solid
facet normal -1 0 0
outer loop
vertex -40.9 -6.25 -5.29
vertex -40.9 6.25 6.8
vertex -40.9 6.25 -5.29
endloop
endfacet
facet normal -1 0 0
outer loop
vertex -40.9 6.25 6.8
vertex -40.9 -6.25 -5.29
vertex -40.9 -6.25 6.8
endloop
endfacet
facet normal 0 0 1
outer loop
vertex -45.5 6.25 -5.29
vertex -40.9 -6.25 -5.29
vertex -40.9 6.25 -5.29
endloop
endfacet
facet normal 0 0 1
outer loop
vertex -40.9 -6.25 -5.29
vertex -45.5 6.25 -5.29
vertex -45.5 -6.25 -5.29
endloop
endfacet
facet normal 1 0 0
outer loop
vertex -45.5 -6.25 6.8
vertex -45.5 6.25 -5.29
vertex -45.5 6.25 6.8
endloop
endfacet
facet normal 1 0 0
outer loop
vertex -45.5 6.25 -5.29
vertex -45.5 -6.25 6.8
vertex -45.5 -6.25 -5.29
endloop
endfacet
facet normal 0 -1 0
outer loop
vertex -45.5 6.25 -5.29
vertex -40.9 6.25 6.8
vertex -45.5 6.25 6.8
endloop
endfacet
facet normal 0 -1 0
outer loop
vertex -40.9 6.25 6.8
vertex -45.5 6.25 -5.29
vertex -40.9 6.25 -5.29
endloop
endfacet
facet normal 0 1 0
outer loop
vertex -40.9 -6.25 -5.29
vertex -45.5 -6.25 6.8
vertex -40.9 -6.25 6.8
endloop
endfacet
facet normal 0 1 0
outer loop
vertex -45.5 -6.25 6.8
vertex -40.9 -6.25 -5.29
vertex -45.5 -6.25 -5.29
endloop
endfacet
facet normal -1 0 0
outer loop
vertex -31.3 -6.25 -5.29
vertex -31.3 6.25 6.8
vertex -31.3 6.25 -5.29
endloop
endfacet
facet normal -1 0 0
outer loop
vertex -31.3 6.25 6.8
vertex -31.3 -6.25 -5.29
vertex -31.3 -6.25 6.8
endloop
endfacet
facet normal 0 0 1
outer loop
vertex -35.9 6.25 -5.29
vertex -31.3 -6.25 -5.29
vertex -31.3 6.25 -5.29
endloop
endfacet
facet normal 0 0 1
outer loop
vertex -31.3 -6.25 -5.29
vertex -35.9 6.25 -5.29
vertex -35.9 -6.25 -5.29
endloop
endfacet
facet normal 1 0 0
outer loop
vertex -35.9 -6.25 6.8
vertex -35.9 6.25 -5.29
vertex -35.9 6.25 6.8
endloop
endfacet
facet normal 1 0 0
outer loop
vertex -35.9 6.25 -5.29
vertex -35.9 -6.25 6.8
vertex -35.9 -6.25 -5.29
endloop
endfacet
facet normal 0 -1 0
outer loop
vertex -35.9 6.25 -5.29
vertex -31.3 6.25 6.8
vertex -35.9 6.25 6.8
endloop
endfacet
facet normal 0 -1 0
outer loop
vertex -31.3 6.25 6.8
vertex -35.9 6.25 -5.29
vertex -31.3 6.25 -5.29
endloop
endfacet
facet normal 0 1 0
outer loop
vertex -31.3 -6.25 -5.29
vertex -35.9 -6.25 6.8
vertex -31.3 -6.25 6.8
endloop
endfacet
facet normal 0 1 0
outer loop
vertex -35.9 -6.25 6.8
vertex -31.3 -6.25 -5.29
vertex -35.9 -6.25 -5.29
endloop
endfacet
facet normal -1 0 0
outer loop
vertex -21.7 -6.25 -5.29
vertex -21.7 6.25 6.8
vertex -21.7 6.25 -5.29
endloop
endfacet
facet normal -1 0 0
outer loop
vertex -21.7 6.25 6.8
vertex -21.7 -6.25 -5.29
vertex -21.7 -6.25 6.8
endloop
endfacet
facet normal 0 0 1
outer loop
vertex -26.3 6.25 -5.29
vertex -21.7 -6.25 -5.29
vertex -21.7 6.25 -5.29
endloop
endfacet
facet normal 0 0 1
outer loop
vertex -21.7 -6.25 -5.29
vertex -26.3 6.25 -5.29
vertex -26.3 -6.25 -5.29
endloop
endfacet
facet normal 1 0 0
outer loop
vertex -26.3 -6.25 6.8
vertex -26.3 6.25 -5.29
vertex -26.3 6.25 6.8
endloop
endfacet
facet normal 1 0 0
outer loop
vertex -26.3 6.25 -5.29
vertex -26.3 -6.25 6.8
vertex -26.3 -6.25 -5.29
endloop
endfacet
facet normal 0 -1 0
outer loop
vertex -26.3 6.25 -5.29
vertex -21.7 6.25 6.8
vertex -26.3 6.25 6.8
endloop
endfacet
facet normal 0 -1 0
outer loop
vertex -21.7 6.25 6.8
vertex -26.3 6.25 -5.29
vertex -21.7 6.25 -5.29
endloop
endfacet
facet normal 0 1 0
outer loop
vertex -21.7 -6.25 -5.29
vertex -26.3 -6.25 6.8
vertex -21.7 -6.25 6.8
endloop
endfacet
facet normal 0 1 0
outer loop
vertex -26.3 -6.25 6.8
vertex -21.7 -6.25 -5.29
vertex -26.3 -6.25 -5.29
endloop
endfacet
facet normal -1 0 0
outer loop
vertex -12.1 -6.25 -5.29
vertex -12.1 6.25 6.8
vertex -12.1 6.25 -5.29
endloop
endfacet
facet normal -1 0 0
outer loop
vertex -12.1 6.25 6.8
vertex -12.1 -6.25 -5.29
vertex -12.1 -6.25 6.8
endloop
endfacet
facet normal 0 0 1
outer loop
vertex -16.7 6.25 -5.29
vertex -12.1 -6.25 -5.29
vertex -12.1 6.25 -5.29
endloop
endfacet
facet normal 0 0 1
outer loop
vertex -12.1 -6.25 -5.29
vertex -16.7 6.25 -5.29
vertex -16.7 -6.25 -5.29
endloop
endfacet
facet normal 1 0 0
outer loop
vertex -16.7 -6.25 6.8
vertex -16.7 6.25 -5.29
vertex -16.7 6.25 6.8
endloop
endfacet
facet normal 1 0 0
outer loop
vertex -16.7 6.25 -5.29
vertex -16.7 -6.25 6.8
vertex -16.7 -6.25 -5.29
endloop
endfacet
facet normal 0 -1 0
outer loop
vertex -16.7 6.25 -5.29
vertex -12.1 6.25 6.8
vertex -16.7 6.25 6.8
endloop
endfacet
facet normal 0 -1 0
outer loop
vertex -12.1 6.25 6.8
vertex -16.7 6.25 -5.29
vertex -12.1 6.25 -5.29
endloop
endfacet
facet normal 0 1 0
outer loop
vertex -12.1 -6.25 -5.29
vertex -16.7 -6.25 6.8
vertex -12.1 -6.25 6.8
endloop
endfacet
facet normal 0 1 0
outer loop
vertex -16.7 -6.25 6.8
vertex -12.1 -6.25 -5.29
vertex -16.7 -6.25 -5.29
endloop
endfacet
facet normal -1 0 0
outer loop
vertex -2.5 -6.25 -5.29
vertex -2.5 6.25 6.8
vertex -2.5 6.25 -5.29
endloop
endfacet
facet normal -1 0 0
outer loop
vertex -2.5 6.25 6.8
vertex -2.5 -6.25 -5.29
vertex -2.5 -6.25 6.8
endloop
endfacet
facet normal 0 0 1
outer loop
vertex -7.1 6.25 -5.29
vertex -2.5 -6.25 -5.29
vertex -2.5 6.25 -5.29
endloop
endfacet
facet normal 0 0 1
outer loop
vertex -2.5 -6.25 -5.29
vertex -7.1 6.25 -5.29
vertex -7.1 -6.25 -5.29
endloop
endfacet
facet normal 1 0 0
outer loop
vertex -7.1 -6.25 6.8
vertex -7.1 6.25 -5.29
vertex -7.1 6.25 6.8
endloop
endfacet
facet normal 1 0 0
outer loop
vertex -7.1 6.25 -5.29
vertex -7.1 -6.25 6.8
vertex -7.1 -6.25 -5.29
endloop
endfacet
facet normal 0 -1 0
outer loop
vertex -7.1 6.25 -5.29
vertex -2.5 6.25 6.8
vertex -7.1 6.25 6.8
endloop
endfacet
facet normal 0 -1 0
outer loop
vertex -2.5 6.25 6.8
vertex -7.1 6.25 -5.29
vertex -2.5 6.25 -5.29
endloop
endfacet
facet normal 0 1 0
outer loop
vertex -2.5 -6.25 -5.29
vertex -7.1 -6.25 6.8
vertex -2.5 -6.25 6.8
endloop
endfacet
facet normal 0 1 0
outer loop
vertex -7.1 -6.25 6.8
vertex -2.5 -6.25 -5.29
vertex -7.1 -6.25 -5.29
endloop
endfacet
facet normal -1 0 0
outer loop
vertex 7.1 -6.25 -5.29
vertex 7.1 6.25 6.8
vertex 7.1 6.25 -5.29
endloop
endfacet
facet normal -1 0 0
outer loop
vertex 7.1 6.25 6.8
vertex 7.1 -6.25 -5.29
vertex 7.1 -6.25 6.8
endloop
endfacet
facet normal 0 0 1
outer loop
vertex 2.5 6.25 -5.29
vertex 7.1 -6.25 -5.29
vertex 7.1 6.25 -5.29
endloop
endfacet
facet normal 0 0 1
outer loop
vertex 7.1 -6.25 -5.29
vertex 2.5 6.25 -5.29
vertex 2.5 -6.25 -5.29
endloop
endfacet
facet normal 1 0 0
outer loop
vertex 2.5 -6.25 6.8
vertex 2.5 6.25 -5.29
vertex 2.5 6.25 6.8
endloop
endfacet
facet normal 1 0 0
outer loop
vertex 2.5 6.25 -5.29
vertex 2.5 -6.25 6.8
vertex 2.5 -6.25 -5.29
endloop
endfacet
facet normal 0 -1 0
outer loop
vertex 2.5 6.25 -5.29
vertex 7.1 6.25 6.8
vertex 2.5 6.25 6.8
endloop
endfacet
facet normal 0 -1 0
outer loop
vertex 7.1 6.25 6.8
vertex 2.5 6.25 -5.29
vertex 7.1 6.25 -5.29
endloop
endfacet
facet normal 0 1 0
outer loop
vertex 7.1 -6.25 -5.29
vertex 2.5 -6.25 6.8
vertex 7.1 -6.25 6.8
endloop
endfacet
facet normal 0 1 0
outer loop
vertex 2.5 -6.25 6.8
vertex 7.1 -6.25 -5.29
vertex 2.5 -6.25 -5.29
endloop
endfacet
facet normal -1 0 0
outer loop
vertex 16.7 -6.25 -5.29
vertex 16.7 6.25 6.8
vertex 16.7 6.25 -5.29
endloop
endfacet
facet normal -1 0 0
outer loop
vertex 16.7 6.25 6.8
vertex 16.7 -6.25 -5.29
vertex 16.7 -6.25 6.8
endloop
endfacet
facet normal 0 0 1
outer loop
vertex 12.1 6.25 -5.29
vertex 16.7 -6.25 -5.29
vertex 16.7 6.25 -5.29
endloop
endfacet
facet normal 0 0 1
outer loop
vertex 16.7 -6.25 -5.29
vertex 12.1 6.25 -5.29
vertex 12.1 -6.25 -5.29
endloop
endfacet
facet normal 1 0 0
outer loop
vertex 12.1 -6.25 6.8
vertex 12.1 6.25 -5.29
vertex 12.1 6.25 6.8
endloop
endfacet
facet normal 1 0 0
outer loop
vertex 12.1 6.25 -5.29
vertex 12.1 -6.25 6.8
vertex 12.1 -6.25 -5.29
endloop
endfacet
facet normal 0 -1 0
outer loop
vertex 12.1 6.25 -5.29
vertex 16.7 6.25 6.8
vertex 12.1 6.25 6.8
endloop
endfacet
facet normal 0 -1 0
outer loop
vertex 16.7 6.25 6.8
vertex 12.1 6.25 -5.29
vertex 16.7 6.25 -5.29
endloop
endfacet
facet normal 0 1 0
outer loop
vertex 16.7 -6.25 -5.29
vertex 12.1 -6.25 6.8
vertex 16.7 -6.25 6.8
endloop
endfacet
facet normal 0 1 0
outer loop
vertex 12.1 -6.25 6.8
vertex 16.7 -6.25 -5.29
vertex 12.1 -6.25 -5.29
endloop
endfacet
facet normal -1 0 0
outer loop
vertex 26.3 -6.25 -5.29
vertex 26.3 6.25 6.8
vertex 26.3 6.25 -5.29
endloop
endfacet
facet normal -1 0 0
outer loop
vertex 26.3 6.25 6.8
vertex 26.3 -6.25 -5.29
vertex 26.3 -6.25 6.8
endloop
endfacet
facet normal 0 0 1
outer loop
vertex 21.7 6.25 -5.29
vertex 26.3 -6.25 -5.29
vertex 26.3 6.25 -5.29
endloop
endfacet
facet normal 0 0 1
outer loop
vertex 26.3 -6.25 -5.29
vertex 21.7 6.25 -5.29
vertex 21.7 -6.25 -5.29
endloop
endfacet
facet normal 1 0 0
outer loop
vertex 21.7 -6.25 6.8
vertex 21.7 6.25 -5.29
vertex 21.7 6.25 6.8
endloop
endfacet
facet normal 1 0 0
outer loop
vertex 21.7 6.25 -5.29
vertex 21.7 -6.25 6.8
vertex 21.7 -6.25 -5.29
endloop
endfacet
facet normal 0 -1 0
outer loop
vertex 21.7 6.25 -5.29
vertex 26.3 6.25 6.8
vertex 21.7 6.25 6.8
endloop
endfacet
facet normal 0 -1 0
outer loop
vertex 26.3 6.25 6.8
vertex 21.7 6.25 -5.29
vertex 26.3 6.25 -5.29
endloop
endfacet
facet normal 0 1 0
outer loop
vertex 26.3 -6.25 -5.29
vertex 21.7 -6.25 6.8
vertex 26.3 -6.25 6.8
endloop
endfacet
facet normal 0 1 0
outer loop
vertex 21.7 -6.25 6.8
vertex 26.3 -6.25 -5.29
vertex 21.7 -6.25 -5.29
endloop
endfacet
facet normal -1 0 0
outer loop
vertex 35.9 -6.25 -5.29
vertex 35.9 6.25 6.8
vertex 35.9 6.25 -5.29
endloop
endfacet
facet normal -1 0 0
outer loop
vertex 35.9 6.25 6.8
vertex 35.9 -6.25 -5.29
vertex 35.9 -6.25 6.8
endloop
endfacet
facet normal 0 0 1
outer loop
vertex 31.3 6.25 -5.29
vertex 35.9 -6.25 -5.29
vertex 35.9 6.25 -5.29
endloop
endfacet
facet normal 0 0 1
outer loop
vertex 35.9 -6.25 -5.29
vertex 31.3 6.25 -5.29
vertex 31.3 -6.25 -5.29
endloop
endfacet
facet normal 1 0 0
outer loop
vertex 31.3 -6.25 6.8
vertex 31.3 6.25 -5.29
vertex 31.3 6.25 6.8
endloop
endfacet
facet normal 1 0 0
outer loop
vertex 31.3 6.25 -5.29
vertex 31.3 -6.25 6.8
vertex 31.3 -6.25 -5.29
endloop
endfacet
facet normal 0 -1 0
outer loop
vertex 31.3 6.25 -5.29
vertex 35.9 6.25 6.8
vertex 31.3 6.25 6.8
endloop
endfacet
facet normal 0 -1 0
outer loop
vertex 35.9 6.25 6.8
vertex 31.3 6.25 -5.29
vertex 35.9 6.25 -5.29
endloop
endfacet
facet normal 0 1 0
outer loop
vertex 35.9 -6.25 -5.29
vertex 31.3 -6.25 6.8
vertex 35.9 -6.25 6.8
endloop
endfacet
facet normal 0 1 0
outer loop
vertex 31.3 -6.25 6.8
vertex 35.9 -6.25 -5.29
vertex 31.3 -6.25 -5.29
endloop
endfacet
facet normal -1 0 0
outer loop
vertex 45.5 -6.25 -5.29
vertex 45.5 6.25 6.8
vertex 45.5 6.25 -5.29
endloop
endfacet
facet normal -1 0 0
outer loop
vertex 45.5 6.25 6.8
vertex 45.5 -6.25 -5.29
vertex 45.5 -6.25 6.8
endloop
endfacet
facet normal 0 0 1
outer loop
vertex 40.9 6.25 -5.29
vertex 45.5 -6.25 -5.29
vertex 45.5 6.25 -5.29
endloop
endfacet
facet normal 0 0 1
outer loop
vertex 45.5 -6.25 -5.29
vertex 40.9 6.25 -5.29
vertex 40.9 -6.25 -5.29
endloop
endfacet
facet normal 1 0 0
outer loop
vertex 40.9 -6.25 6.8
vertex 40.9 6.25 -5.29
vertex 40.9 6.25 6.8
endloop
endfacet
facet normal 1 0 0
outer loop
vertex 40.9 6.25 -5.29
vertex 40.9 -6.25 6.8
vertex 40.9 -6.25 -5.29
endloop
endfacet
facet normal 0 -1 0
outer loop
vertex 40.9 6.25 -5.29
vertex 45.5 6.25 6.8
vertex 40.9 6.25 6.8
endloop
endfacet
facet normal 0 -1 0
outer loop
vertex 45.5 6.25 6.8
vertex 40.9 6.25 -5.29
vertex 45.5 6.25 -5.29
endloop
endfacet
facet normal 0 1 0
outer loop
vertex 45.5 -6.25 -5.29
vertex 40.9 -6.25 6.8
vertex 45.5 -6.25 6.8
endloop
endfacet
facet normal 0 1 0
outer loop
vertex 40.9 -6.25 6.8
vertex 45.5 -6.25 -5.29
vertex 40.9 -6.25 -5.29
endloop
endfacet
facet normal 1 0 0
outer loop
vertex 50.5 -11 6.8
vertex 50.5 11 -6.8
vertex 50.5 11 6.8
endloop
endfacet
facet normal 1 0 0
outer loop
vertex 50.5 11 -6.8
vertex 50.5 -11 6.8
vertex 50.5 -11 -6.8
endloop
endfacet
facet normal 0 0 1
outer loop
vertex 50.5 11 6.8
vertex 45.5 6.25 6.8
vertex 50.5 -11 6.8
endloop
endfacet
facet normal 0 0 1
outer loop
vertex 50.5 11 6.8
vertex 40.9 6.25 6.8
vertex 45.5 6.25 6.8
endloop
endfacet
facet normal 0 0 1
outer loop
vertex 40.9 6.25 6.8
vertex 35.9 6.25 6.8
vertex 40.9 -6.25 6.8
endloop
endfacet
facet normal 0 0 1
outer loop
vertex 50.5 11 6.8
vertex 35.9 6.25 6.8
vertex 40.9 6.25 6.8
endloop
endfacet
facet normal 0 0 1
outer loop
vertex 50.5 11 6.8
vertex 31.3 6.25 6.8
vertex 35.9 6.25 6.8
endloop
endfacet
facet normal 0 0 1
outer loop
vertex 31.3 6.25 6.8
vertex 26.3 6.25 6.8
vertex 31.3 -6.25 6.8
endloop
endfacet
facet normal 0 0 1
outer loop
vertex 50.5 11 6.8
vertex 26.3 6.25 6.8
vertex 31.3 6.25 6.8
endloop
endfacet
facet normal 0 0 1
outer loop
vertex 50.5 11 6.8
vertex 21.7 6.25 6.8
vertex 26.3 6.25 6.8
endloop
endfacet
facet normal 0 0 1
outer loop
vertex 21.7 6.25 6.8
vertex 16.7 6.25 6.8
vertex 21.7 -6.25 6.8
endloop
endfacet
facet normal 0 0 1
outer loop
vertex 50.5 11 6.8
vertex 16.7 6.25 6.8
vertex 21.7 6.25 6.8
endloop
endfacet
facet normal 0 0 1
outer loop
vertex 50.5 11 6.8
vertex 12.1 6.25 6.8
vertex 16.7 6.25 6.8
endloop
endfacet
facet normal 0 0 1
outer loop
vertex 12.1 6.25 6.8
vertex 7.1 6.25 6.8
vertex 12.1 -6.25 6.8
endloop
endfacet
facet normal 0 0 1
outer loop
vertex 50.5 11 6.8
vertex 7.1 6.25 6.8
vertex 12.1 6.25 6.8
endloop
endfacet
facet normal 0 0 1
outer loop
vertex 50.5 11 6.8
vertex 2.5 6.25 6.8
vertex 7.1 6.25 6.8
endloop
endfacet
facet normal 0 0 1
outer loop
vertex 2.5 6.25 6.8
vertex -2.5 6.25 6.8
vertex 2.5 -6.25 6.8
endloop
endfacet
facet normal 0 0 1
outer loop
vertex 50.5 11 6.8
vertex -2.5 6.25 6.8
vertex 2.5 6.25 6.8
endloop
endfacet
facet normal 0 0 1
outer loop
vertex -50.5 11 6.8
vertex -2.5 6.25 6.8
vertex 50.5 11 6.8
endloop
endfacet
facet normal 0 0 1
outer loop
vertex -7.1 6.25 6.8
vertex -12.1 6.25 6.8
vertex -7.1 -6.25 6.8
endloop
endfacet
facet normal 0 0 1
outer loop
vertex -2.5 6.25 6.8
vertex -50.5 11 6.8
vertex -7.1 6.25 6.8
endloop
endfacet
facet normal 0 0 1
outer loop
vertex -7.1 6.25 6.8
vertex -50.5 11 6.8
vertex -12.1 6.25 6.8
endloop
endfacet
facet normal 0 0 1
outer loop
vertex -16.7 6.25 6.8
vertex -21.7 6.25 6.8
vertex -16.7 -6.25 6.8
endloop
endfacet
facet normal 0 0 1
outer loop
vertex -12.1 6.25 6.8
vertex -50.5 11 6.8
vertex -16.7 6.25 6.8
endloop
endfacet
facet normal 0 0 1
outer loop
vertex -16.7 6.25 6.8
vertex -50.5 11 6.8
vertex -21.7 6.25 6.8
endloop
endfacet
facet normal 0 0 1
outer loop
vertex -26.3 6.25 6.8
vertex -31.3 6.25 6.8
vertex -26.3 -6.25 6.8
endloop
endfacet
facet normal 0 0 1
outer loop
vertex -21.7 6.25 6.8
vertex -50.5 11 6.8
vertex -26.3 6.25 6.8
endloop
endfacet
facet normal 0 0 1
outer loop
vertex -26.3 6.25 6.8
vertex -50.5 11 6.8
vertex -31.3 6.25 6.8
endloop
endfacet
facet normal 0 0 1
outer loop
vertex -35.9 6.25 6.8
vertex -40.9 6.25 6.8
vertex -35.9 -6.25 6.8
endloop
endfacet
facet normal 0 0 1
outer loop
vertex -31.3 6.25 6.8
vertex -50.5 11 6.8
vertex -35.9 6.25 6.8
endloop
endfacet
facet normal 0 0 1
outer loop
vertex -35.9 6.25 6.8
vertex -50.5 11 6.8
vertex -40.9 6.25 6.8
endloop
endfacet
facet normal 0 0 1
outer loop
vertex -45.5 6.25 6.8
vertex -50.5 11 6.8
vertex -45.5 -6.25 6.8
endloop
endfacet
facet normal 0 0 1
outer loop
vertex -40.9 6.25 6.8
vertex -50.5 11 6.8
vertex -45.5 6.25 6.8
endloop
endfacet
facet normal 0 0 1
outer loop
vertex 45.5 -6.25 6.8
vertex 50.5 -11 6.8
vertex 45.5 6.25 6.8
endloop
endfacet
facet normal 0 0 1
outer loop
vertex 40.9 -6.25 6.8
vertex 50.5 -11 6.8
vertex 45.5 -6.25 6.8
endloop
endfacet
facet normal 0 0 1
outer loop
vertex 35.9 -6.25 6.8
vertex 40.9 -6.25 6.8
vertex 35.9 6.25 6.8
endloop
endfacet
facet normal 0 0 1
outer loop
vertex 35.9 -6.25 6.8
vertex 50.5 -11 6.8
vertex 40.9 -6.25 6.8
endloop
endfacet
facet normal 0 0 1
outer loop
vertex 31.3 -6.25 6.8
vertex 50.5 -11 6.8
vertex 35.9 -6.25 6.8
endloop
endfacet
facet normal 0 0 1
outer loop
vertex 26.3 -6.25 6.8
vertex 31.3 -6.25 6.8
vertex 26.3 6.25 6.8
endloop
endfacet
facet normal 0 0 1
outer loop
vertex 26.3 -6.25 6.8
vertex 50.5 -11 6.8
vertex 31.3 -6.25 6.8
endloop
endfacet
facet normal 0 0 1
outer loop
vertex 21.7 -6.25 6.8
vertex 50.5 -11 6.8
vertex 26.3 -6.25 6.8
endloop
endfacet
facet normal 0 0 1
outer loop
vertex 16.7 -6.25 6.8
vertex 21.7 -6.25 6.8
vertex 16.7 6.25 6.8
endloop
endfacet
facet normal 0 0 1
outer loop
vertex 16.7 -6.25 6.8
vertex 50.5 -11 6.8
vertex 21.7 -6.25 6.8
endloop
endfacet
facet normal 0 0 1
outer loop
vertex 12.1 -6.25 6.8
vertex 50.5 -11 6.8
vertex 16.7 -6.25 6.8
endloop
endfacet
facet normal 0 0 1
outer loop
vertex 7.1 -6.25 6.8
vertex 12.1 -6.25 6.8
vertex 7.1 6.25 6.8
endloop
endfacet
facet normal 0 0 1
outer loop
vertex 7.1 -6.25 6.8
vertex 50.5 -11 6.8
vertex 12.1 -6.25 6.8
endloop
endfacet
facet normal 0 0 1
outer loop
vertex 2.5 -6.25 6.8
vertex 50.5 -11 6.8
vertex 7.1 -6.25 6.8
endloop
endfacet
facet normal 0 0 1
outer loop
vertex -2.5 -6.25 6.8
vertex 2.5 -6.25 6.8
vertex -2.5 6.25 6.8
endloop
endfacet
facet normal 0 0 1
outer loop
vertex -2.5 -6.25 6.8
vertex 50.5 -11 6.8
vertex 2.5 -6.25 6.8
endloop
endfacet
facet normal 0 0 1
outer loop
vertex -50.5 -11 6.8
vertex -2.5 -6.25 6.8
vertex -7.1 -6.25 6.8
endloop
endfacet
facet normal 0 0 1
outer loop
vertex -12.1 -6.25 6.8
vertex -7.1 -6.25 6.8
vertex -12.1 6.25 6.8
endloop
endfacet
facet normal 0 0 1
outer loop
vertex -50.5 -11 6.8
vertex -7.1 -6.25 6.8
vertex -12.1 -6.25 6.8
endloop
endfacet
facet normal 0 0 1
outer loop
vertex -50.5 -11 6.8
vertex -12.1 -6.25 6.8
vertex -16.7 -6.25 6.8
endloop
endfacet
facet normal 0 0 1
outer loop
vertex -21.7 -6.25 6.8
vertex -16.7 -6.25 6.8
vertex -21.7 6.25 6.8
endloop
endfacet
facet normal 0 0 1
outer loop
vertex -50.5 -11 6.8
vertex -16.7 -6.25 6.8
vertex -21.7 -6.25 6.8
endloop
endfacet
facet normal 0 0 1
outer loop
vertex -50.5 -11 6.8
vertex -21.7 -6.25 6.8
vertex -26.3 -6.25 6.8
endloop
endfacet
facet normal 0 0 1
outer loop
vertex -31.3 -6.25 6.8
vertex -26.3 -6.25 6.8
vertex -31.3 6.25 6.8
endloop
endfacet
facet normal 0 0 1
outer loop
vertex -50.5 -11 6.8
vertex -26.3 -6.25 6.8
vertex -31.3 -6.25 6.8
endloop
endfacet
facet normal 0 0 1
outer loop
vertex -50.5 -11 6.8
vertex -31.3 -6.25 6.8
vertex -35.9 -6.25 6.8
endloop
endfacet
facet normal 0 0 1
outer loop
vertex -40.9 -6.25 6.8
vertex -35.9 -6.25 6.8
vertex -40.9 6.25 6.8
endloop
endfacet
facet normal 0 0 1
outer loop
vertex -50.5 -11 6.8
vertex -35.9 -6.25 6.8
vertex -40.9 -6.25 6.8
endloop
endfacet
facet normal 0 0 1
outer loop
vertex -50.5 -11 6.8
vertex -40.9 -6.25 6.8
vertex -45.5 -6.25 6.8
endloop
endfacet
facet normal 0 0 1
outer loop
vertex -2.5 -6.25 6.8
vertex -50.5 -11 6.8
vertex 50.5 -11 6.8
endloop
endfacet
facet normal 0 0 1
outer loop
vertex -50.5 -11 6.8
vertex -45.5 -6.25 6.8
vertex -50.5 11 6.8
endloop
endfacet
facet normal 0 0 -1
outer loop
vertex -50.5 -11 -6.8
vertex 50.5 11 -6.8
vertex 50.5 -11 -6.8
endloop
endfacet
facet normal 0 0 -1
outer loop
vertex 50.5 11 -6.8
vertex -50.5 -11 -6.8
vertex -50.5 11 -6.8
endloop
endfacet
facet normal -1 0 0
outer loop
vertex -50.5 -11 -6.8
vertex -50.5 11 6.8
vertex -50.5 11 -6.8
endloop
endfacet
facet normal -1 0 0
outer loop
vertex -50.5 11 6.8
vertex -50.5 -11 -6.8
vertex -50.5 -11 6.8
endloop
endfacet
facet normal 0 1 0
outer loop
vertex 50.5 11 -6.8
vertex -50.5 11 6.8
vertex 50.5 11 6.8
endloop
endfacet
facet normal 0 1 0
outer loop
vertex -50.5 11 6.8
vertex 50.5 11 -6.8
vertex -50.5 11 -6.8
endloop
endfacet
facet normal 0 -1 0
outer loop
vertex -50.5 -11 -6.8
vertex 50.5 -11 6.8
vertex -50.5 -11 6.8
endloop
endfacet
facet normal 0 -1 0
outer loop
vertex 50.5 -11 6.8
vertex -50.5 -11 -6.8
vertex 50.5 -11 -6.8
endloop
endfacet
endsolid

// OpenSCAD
/**
 * usb-thumb-holder.scad
 * A holder for USB thumb devices that have an exposed USB port and
 * isn't very thick.
 *
 * @author Nathan Campos <nathan@innoveworkshop.com>
 */

// Generation parameters.
nslots  = 10;
spacing = 5;
cased   = 22;

// USB port dimensions.
portw = 4.6;
portd = 12.5;
porth = 12.1;

// Spacings dimensions.
floorh = 1.5;

// Ensure a high-end render.
$fs = $preview ? 2 : 0.1;

/**
 * USB slot cube.
 *
 * @param center Center up the slot.
 */
module usb_slot(center = true) {
	cube([portw, portd, porth], center = center);
}

/**
 * Builds up a USB slot array.
 *
 * @param slots Number of USB slots.
 */
module slot_array(slots = nslots) {
	translate([-((spacing + portw) * (slots - 1)) / 2, 0, 0])
	for (i = [0 : (slots - 1)]) {
		color("red")
		translate([((portw / 2) + (spacing + (portw / 2))) * i, 0, 0])
			usb_slot();
	}
}

// Build up the case.
difference() {
	// Case
	cube([((spacing + portw) * nslots) + spacing, cased, porth + floorh], center = true);

	// Slots
	translate([0, 0, (floorh / 2) + 0.01])
		slot_array();
}
